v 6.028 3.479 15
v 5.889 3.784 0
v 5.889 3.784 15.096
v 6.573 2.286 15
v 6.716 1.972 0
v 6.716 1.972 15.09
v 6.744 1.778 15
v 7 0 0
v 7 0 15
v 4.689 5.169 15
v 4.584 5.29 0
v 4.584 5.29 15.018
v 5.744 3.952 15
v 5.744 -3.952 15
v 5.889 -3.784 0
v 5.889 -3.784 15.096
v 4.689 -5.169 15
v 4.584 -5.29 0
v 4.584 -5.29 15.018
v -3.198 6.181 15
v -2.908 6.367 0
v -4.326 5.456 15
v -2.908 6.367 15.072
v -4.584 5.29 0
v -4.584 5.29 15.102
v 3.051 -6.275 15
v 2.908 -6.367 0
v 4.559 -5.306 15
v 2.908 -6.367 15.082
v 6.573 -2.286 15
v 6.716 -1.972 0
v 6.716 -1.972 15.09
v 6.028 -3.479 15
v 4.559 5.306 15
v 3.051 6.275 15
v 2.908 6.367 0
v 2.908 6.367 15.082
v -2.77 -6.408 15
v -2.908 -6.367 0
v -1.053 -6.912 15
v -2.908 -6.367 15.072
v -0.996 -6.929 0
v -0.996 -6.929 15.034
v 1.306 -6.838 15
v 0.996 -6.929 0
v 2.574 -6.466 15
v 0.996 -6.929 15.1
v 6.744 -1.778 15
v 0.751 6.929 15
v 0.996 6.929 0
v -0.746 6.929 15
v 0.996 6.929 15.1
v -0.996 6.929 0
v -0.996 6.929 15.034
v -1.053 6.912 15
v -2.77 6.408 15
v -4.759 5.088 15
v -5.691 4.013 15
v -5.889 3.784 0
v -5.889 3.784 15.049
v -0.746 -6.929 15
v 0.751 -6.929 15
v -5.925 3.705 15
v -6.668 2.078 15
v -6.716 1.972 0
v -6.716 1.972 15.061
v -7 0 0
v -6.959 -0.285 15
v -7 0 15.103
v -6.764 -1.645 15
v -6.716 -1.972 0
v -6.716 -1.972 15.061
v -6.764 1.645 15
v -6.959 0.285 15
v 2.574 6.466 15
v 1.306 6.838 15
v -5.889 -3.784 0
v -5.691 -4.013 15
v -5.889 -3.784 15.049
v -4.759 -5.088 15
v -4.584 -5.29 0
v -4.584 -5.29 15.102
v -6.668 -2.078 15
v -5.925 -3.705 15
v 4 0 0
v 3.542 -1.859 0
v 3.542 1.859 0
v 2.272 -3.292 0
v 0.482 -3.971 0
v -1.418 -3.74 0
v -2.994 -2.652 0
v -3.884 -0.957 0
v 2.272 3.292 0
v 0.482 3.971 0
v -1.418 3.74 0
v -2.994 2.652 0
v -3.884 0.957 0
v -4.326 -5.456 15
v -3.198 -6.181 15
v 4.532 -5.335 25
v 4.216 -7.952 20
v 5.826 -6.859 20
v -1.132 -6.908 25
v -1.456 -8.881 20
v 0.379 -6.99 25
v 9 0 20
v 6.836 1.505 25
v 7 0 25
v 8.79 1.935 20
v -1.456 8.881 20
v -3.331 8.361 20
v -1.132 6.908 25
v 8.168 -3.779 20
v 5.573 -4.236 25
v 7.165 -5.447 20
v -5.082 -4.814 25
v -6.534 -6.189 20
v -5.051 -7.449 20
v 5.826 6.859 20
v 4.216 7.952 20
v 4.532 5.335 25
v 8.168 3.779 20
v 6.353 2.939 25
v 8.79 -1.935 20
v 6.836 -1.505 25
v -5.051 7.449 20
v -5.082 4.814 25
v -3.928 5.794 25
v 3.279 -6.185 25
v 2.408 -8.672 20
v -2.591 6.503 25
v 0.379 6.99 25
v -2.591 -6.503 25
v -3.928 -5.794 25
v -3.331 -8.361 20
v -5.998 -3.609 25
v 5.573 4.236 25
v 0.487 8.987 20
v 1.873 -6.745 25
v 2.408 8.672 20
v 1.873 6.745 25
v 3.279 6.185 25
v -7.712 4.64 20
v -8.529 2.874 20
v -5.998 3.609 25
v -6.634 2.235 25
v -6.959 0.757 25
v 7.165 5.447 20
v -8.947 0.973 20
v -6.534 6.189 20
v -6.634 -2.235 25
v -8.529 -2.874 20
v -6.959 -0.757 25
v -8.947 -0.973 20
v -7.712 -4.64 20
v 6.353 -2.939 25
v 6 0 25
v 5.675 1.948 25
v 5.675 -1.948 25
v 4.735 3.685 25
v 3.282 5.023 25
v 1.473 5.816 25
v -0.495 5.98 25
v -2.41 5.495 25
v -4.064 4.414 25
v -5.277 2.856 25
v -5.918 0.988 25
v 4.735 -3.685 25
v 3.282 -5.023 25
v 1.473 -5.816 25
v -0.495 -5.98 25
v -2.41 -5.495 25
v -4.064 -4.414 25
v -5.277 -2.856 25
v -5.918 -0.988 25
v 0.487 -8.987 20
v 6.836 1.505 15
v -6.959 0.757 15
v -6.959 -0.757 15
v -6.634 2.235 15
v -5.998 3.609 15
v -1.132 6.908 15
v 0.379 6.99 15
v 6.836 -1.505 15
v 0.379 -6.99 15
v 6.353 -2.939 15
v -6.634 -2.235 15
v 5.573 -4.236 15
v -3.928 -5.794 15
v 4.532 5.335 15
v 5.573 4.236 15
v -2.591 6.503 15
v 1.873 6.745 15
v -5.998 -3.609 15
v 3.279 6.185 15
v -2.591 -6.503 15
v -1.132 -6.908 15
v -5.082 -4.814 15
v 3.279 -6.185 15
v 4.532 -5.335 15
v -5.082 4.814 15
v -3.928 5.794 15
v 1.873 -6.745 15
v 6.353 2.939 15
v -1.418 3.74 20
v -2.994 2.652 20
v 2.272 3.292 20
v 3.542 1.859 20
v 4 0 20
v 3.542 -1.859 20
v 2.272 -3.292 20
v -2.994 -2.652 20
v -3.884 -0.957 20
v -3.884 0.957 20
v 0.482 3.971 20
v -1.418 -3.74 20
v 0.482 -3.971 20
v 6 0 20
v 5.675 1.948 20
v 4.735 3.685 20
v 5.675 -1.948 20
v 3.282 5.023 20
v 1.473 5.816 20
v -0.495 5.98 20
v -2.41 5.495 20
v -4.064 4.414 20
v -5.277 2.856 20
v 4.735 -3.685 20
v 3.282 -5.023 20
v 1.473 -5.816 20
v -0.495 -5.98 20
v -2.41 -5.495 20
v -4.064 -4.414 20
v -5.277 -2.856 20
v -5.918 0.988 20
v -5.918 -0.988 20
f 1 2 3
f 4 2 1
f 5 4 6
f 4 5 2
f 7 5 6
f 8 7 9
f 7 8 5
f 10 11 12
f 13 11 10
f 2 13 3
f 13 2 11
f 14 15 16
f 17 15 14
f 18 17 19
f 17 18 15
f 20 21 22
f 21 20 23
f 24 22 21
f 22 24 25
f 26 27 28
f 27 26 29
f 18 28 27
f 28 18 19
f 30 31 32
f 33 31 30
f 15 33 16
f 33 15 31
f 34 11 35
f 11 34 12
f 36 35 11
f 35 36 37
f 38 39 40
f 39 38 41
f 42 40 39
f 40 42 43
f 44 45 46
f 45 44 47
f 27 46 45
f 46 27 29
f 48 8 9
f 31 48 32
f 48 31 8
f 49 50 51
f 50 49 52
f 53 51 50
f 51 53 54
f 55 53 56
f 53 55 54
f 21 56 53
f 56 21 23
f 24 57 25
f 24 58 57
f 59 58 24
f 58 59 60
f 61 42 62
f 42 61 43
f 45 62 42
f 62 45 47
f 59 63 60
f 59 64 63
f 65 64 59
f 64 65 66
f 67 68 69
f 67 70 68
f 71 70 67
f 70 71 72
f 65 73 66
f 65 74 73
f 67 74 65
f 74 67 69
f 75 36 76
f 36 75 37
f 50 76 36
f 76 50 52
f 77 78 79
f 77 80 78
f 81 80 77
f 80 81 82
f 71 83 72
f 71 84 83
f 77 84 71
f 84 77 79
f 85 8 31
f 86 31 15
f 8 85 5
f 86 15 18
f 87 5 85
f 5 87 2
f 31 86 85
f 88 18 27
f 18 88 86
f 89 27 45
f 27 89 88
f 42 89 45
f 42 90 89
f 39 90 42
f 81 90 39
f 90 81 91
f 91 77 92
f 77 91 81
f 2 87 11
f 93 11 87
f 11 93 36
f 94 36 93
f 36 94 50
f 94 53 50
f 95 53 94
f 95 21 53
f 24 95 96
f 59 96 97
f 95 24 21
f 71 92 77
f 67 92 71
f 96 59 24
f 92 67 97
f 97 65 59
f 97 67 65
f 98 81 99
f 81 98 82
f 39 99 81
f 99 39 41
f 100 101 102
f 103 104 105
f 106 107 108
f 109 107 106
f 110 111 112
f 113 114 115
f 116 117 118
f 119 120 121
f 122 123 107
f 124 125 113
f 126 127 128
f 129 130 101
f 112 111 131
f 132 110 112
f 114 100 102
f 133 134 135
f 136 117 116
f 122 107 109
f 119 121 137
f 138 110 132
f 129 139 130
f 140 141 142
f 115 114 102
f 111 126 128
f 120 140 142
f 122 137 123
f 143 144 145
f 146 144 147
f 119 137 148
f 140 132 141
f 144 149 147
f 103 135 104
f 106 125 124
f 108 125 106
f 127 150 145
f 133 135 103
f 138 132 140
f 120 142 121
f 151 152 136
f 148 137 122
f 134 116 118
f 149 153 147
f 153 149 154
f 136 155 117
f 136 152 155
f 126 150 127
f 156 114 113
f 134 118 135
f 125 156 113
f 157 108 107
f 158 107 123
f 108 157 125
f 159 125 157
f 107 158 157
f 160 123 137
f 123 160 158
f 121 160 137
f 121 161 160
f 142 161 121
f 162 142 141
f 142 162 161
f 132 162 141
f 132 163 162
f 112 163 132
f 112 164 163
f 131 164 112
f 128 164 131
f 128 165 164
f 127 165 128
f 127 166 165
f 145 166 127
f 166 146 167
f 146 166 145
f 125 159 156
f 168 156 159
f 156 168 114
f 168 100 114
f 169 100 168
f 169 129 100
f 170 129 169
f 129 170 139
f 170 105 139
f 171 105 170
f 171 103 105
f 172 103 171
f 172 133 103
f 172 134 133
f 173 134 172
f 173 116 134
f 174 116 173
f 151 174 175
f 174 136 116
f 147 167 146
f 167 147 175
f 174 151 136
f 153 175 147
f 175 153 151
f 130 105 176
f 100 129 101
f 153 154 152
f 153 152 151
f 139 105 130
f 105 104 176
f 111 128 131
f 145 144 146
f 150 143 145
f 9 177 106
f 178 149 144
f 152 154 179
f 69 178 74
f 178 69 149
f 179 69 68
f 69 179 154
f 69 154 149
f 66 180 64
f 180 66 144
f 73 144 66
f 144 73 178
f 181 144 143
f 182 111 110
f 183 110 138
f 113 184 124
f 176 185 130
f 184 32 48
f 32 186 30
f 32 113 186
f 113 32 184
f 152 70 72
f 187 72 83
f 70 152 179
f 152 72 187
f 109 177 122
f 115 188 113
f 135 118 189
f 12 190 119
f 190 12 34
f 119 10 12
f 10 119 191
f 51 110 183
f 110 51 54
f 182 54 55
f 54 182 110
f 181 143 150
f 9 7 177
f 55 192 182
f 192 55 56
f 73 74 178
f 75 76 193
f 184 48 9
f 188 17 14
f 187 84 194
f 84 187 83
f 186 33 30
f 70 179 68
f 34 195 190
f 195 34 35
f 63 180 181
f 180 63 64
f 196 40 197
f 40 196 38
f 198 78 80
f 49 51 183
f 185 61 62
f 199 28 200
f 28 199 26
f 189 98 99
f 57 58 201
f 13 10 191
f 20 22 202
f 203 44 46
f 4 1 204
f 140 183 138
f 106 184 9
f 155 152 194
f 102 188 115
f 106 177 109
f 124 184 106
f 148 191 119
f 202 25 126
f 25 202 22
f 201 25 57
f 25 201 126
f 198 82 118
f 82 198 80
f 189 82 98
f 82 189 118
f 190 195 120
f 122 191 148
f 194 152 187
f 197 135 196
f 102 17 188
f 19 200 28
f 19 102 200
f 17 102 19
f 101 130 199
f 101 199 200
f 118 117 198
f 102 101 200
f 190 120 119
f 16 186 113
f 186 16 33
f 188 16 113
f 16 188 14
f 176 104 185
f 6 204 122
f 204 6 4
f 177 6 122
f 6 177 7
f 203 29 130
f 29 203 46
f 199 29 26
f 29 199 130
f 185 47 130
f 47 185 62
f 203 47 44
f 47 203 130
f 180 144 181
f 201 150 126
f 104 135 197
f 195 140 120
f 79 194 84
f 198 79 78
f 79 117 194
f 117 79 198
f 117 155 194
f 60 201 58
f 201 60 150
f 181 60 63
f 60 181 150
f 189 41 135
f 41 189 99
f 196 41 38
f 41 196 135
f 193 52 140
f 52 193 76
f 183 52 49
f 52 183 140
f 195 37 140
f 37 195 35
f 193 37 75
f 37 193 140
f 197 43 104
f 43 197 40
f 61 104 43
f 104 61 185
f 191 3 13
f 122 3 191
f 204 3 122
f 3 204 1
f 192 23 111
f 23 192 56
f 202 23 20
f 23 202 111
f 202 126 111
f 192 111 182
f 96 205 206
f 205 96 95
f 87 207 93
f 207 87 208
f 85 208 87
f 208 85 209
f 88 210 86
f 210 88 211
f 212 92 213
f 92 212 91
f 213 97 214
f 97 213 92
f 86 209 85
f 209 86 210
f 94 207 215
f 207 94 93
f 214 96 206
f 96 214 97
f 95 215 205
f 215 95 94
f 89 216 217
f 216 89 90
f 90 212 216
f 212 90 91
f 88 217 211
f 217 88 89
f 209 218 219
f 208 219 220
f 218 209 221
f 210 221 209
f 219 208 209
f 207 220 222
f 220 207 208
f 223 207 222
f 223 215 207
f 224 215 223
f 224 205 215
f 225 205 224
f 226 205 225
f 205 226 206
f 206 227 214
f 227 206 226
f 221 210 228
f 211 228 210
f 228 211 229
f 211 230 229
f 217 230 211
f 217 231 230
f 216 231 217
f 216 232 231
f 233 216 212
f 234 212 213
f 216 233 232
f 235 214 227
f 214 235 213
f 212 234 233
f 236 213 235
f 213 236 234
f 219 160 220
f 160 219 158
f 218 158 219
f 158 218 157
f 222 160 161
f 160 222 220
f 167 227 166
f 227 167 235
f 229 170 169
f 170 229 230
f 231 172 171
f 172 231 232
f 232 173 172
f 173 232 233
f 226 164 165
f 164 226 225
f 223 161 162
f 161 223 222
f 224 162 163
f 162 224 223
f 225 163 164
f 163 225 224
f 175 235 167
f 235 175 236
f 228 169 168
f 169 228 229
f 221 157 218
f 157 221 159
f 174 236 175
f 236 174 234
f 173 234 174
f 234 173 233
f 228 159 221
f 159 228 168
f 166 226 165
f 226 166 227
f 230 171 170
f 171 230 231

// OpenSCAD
difference()
{
    union(){
        cylinder(r=7,h=20);
        translate([0,0,20])cylinder(r1=9, r2=7,h=5);
        translate([0,0,15])cylinder(r1=7, r2=9,h=5);
    }
    cylinder(r=4,h=20);
    translate([0,0,20])cylinder(r=6,h=5);
}
